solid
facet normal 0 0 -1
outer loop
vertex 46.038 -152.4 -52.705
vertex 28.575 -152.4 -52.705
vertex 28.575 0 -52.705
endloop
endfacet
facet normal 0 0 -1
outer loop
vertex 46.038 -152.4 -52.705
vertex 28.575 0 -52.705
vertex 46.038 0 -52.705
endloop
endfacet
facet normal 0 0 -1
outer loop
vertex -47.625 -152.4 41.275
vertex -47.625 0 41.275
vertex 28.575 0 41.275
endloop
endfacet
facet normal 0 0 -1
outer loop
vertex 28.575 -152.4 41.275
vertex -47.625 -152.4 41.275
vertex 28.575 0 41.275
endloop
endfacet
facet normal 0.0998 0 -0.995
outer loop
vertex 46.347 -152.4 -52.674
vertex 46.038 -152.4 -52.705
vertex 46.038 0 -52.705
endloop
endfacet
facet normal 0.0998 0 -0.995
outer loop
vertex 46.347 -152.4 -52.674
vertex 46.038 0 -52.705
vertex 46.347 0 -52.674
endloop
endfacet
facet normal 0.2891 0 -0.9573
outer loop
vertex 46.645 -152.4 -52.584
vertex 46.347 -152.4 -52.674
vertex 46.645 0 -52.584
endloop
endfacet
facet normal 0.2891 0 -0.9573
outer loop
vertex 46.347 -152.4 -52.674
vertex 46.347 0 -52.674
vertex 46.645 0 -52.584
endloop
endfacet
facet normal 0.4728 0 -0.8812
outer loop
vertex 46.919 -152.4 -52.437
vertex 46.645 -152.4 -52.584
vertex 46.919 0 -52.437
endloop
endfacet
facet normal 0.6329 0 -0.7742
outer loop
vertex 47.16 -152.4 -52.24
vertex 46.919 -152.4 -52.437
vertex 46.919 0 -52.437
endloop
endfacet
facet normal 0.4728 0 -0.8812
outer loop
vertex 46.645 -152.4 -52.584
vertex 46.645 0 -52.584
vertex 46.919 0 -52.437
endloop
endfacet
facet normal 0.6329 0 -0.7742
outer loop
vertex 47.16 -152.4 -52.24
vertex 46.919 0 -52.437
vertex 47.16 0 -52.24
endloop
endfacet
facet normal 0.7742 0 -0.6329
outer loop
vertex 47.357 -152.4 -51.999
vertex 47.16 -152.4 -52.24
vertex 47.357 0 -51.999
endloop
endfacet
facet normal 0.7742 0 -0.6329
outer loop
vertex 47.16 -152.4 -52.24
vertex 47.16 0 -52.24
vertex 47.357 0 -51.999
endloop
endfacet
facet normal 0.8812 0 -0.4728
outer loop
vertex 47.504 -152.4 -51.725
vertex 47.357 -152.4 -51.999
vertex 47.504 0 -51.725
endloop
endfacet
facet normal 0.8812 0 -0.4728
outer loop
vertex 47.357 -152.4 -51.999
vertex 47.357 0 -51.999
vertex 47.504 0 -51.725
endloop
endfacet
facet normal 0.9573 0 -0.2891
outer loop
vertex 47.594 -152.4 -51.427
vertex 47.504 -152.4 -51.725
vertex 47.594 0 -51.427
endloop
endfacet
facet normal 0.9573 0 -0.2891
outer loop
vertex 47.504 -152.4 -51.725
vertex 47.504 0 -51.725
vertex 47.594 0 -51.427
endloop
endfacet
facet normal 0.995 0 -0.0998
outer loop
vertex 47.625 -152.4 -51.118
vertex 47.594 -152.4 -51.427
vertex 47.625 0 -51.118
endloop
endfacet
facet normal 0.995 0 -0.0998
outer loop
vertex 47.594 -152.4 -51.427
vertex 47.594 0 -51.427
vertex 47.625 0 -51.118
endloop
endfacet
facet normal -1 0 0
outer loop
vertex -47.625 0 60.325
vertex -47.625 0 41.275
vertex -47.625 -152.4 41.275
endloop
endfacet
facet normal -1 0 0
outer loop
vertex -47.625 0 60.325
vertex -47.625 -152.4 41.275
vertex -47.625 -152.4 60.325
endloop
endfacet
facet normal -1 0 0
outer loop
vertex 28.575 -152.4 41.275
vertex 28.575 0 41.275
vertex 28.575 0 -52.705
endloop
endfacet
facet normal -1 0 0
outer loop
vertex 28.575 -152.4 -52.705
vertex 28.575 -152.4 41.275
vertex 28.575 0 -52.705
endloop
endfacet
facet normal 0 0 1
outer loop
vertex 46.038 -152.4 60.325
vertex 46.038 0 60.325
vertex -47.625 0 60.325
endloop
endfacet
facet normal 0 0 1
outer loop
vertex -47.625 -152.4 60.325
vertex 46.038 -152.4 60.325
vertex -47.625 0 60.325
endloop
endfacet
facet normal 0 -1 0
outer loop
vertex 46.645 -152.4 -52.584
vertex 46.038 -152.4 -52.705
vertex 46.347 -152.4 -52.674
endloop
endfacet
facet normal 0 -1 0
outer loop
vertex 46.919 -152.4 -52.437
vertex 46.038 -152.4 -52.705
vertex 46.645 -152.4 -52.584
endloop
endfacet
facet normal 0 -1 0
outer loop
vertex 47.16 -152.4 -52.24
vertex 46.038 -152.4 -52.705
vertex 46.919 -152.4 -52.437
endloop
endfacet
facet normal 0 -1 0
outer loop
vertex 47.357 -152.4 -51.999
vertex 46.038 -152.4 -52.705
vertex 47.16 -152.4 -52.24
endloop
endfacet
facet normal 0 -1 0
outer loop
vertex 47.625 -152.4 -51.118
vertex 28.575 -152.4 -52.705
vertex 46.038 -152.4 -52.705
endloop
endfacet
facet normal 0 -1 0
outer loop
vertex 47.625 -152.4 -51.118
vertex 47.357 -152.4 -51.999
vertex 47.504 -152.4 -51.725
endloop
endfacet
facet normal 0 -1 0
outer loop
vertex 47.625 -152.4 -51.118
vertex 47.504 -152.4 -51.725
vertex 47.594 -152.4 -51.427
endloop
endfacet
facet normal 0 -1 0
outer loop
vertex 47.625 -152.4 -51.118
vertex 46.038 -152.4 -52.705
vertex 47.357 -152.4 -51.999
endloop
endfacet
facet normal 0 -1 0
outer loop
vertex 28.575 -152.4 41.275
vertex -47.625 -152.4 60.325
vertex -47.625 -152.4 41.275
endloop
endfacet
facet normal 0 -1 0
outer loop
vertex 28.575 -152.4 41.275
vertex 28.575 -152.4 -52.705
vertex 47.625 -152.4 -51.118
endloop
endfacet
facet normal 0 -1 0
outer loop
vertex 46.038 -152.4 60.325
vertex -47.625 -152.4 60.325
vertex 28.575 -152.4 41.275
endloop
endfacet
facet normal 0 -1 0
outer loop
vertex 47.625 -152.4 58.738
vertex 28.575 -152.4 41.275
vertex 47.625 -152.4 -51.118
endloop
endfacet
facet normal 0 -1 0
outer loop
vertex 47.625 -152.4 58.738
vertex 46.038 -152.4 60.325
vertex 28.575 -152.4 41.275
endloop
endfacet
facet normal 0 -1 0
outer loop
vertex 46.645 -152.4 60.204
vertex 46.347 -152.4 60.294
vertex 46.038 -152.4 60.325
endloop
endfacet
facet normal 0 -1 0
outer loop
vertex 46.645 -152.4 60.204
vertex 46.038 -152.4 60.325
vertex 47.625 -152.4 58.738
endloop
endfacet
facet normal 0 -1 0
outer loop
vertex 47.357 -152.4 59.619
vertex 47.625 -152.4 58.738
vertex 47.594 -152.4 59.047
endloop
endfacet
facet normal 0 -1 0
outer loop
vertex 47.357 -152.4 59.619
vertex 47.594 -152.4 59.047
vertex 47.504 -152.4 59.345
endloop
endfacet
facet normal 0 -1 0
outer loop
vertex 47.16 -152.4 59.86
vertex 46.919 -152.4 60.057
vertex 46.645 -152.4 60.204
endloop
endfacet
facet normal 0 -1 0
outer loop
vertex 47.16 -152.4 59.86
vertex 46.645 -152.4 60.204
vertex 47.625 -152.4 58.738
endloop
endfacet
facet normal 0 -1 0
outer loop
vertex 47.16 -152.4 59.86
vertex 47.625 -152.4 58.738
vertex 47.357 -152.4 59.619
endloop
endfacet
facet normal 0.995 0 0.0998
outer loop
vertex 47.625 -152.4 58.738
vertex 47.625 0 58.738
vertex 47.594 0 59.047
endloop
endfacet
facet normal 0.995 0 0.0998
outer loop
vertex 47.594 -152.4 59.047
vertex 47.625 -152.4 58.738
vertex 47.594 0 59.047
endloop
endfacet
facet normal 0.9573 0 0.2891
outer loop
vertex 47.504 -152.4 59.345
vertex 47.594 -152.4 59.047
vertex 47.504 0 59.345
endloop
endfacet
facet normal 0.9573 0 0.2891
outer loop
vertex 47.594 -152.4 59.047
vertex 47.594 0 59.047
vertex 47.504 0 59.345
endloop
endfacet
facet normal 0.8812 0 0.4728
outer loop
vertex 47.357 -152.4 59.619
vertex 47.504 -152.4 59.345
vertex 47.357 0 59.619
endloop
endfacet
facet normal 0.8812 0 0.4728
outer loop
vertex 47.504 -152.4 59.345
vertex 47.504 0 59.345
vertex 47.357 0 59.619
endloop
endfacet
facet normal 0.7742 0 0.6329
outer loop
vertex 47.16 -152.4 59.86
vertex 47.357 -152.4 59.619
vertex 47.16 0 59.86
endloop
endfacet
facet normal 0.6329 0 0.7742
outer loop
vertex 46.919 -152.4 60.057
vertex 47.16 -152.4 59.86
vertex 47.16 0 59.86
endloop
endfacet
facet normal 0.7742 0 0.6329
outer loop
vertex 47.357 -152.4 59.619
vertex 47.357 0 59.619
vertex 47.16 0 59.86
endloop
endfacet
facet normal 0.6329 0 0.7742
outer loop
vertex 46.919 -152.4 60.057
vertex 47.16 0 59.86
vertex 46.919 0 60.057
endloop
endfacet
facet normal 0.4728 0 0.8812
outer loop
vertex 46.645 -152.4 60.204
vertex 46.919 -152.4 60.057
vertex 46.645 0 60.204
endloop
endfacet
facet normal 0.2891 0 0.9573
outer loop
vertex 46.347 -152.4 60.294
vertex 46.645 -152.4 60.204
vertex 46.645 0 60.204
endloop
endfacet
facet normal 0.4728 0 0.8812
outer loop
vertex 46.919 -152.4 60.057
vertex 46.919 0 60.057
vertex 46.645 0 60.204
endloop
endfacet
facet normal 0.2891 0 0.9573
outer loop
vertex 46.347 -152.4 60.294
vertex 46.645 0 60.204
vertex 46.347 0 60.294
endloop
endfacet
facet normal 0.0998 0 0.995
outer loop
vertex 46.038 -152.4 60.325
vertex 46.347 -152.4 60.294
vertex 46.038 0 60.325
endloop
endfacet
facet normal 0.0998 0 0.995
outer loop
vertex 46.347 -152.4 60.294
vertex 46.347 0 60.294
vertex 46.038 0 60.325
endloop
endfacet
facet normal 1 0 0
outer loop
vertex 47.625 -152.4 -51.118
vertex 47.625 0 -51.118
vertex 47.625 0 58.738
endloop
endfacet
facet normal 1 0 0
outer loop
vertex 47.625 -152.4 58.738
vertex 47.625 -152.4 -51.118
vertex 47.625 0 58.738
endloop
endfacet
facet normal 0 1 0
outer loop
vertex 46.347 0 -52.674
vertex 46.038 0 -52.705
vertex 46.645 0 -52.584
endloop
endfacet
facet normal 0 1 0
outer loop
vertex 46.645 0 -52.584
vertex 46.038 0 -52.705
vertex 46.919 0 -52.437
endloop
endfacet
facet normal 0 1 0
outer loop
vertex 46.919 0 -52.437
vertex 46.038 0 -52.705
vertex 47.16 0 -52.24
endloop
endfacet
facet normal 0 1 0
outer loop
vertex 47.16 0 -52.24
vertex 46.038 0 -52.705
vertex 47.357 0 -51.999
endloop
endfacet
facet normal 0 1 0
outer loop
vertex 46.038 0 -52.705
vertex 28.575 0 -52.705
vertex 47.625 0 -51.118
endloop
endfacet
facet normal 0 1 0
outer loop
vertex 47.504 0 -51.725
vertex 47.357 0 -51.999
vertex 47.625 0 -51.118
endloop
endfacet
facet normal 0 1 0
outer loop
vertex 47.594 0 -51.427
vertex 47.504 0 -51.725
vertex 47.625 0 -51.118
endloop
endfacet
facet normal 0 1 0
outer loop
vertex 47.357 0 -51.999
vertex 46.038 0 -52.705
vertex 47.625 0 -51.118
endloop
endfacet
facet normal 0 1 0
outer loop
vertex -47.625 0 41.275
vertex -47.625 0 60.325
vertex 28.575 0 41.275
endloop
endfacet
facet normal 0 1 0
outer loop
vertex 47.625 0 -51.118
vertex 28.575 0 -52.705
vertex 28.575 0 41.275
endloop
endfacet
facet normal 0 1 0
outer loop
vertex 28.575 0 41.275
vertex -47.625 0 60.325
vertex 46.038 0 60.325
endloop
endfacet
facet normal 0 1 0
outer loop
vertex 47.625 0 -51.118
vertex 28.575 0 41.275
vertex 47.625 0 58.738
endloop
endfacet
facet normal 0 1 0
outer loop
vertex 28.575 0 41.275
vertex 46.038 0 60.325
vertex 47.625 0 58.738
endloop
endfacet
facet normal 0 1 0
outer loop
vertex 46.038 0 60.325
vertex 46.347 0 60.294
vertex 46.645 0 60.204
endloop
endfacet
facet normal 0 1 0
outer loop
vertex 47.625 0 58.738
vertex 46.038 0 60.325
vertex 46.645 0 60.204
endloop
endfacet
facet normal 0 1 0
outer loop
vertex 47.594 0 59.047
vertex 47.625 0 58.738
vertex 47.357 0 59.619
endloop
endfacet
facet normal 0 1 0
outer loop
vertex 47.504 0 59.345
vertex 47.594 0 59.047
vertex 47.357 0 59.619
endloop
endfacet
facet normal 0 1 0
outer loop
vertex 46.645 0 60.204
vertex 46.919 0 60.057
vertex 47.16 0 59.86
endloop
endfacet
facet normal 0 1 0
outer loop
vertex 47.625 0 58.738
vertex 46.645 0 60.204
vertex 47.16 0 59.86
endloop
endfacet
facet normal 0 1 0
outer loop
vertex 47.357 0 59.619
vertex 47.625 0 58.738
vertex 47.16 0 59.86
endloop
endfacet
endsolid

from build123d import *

# Parameters (mm, degrees)
F0_W     = 76.2
F0_H     = 19.05
F1_DEPTH = 152.4


with BuildPart() as f1:
    # F0 (on Front) → F1 (new body)
    with BuildSketch(Plane.XZ):
        with BuildLine():
            Line((46.0375, 60.325), (28.575, 60.325))
            Line((28.575, 60.325), (28.575, 41.275))
            Line((28.575, 41.275), (28.575, -52.705))
            Line((28.575, -52.705), (46.0375, -52.705))
            ThreePointArc((46.0375, -52.705), (47.160032, -52.240032), (47.625, -51.1175))
            Line((47.625, -51.1175), (47.625, 58.7375))
            ThreePointArc((47.625, 58.7375), (47.160032, 59.860032), (46.0375, 60.325))
        make_face()
        with Locations((-9.525, 50.8)):
            Rectangle(F0_W, F0_H)
    extrude(amount=F1_DEPTH)


solid = f1.part
